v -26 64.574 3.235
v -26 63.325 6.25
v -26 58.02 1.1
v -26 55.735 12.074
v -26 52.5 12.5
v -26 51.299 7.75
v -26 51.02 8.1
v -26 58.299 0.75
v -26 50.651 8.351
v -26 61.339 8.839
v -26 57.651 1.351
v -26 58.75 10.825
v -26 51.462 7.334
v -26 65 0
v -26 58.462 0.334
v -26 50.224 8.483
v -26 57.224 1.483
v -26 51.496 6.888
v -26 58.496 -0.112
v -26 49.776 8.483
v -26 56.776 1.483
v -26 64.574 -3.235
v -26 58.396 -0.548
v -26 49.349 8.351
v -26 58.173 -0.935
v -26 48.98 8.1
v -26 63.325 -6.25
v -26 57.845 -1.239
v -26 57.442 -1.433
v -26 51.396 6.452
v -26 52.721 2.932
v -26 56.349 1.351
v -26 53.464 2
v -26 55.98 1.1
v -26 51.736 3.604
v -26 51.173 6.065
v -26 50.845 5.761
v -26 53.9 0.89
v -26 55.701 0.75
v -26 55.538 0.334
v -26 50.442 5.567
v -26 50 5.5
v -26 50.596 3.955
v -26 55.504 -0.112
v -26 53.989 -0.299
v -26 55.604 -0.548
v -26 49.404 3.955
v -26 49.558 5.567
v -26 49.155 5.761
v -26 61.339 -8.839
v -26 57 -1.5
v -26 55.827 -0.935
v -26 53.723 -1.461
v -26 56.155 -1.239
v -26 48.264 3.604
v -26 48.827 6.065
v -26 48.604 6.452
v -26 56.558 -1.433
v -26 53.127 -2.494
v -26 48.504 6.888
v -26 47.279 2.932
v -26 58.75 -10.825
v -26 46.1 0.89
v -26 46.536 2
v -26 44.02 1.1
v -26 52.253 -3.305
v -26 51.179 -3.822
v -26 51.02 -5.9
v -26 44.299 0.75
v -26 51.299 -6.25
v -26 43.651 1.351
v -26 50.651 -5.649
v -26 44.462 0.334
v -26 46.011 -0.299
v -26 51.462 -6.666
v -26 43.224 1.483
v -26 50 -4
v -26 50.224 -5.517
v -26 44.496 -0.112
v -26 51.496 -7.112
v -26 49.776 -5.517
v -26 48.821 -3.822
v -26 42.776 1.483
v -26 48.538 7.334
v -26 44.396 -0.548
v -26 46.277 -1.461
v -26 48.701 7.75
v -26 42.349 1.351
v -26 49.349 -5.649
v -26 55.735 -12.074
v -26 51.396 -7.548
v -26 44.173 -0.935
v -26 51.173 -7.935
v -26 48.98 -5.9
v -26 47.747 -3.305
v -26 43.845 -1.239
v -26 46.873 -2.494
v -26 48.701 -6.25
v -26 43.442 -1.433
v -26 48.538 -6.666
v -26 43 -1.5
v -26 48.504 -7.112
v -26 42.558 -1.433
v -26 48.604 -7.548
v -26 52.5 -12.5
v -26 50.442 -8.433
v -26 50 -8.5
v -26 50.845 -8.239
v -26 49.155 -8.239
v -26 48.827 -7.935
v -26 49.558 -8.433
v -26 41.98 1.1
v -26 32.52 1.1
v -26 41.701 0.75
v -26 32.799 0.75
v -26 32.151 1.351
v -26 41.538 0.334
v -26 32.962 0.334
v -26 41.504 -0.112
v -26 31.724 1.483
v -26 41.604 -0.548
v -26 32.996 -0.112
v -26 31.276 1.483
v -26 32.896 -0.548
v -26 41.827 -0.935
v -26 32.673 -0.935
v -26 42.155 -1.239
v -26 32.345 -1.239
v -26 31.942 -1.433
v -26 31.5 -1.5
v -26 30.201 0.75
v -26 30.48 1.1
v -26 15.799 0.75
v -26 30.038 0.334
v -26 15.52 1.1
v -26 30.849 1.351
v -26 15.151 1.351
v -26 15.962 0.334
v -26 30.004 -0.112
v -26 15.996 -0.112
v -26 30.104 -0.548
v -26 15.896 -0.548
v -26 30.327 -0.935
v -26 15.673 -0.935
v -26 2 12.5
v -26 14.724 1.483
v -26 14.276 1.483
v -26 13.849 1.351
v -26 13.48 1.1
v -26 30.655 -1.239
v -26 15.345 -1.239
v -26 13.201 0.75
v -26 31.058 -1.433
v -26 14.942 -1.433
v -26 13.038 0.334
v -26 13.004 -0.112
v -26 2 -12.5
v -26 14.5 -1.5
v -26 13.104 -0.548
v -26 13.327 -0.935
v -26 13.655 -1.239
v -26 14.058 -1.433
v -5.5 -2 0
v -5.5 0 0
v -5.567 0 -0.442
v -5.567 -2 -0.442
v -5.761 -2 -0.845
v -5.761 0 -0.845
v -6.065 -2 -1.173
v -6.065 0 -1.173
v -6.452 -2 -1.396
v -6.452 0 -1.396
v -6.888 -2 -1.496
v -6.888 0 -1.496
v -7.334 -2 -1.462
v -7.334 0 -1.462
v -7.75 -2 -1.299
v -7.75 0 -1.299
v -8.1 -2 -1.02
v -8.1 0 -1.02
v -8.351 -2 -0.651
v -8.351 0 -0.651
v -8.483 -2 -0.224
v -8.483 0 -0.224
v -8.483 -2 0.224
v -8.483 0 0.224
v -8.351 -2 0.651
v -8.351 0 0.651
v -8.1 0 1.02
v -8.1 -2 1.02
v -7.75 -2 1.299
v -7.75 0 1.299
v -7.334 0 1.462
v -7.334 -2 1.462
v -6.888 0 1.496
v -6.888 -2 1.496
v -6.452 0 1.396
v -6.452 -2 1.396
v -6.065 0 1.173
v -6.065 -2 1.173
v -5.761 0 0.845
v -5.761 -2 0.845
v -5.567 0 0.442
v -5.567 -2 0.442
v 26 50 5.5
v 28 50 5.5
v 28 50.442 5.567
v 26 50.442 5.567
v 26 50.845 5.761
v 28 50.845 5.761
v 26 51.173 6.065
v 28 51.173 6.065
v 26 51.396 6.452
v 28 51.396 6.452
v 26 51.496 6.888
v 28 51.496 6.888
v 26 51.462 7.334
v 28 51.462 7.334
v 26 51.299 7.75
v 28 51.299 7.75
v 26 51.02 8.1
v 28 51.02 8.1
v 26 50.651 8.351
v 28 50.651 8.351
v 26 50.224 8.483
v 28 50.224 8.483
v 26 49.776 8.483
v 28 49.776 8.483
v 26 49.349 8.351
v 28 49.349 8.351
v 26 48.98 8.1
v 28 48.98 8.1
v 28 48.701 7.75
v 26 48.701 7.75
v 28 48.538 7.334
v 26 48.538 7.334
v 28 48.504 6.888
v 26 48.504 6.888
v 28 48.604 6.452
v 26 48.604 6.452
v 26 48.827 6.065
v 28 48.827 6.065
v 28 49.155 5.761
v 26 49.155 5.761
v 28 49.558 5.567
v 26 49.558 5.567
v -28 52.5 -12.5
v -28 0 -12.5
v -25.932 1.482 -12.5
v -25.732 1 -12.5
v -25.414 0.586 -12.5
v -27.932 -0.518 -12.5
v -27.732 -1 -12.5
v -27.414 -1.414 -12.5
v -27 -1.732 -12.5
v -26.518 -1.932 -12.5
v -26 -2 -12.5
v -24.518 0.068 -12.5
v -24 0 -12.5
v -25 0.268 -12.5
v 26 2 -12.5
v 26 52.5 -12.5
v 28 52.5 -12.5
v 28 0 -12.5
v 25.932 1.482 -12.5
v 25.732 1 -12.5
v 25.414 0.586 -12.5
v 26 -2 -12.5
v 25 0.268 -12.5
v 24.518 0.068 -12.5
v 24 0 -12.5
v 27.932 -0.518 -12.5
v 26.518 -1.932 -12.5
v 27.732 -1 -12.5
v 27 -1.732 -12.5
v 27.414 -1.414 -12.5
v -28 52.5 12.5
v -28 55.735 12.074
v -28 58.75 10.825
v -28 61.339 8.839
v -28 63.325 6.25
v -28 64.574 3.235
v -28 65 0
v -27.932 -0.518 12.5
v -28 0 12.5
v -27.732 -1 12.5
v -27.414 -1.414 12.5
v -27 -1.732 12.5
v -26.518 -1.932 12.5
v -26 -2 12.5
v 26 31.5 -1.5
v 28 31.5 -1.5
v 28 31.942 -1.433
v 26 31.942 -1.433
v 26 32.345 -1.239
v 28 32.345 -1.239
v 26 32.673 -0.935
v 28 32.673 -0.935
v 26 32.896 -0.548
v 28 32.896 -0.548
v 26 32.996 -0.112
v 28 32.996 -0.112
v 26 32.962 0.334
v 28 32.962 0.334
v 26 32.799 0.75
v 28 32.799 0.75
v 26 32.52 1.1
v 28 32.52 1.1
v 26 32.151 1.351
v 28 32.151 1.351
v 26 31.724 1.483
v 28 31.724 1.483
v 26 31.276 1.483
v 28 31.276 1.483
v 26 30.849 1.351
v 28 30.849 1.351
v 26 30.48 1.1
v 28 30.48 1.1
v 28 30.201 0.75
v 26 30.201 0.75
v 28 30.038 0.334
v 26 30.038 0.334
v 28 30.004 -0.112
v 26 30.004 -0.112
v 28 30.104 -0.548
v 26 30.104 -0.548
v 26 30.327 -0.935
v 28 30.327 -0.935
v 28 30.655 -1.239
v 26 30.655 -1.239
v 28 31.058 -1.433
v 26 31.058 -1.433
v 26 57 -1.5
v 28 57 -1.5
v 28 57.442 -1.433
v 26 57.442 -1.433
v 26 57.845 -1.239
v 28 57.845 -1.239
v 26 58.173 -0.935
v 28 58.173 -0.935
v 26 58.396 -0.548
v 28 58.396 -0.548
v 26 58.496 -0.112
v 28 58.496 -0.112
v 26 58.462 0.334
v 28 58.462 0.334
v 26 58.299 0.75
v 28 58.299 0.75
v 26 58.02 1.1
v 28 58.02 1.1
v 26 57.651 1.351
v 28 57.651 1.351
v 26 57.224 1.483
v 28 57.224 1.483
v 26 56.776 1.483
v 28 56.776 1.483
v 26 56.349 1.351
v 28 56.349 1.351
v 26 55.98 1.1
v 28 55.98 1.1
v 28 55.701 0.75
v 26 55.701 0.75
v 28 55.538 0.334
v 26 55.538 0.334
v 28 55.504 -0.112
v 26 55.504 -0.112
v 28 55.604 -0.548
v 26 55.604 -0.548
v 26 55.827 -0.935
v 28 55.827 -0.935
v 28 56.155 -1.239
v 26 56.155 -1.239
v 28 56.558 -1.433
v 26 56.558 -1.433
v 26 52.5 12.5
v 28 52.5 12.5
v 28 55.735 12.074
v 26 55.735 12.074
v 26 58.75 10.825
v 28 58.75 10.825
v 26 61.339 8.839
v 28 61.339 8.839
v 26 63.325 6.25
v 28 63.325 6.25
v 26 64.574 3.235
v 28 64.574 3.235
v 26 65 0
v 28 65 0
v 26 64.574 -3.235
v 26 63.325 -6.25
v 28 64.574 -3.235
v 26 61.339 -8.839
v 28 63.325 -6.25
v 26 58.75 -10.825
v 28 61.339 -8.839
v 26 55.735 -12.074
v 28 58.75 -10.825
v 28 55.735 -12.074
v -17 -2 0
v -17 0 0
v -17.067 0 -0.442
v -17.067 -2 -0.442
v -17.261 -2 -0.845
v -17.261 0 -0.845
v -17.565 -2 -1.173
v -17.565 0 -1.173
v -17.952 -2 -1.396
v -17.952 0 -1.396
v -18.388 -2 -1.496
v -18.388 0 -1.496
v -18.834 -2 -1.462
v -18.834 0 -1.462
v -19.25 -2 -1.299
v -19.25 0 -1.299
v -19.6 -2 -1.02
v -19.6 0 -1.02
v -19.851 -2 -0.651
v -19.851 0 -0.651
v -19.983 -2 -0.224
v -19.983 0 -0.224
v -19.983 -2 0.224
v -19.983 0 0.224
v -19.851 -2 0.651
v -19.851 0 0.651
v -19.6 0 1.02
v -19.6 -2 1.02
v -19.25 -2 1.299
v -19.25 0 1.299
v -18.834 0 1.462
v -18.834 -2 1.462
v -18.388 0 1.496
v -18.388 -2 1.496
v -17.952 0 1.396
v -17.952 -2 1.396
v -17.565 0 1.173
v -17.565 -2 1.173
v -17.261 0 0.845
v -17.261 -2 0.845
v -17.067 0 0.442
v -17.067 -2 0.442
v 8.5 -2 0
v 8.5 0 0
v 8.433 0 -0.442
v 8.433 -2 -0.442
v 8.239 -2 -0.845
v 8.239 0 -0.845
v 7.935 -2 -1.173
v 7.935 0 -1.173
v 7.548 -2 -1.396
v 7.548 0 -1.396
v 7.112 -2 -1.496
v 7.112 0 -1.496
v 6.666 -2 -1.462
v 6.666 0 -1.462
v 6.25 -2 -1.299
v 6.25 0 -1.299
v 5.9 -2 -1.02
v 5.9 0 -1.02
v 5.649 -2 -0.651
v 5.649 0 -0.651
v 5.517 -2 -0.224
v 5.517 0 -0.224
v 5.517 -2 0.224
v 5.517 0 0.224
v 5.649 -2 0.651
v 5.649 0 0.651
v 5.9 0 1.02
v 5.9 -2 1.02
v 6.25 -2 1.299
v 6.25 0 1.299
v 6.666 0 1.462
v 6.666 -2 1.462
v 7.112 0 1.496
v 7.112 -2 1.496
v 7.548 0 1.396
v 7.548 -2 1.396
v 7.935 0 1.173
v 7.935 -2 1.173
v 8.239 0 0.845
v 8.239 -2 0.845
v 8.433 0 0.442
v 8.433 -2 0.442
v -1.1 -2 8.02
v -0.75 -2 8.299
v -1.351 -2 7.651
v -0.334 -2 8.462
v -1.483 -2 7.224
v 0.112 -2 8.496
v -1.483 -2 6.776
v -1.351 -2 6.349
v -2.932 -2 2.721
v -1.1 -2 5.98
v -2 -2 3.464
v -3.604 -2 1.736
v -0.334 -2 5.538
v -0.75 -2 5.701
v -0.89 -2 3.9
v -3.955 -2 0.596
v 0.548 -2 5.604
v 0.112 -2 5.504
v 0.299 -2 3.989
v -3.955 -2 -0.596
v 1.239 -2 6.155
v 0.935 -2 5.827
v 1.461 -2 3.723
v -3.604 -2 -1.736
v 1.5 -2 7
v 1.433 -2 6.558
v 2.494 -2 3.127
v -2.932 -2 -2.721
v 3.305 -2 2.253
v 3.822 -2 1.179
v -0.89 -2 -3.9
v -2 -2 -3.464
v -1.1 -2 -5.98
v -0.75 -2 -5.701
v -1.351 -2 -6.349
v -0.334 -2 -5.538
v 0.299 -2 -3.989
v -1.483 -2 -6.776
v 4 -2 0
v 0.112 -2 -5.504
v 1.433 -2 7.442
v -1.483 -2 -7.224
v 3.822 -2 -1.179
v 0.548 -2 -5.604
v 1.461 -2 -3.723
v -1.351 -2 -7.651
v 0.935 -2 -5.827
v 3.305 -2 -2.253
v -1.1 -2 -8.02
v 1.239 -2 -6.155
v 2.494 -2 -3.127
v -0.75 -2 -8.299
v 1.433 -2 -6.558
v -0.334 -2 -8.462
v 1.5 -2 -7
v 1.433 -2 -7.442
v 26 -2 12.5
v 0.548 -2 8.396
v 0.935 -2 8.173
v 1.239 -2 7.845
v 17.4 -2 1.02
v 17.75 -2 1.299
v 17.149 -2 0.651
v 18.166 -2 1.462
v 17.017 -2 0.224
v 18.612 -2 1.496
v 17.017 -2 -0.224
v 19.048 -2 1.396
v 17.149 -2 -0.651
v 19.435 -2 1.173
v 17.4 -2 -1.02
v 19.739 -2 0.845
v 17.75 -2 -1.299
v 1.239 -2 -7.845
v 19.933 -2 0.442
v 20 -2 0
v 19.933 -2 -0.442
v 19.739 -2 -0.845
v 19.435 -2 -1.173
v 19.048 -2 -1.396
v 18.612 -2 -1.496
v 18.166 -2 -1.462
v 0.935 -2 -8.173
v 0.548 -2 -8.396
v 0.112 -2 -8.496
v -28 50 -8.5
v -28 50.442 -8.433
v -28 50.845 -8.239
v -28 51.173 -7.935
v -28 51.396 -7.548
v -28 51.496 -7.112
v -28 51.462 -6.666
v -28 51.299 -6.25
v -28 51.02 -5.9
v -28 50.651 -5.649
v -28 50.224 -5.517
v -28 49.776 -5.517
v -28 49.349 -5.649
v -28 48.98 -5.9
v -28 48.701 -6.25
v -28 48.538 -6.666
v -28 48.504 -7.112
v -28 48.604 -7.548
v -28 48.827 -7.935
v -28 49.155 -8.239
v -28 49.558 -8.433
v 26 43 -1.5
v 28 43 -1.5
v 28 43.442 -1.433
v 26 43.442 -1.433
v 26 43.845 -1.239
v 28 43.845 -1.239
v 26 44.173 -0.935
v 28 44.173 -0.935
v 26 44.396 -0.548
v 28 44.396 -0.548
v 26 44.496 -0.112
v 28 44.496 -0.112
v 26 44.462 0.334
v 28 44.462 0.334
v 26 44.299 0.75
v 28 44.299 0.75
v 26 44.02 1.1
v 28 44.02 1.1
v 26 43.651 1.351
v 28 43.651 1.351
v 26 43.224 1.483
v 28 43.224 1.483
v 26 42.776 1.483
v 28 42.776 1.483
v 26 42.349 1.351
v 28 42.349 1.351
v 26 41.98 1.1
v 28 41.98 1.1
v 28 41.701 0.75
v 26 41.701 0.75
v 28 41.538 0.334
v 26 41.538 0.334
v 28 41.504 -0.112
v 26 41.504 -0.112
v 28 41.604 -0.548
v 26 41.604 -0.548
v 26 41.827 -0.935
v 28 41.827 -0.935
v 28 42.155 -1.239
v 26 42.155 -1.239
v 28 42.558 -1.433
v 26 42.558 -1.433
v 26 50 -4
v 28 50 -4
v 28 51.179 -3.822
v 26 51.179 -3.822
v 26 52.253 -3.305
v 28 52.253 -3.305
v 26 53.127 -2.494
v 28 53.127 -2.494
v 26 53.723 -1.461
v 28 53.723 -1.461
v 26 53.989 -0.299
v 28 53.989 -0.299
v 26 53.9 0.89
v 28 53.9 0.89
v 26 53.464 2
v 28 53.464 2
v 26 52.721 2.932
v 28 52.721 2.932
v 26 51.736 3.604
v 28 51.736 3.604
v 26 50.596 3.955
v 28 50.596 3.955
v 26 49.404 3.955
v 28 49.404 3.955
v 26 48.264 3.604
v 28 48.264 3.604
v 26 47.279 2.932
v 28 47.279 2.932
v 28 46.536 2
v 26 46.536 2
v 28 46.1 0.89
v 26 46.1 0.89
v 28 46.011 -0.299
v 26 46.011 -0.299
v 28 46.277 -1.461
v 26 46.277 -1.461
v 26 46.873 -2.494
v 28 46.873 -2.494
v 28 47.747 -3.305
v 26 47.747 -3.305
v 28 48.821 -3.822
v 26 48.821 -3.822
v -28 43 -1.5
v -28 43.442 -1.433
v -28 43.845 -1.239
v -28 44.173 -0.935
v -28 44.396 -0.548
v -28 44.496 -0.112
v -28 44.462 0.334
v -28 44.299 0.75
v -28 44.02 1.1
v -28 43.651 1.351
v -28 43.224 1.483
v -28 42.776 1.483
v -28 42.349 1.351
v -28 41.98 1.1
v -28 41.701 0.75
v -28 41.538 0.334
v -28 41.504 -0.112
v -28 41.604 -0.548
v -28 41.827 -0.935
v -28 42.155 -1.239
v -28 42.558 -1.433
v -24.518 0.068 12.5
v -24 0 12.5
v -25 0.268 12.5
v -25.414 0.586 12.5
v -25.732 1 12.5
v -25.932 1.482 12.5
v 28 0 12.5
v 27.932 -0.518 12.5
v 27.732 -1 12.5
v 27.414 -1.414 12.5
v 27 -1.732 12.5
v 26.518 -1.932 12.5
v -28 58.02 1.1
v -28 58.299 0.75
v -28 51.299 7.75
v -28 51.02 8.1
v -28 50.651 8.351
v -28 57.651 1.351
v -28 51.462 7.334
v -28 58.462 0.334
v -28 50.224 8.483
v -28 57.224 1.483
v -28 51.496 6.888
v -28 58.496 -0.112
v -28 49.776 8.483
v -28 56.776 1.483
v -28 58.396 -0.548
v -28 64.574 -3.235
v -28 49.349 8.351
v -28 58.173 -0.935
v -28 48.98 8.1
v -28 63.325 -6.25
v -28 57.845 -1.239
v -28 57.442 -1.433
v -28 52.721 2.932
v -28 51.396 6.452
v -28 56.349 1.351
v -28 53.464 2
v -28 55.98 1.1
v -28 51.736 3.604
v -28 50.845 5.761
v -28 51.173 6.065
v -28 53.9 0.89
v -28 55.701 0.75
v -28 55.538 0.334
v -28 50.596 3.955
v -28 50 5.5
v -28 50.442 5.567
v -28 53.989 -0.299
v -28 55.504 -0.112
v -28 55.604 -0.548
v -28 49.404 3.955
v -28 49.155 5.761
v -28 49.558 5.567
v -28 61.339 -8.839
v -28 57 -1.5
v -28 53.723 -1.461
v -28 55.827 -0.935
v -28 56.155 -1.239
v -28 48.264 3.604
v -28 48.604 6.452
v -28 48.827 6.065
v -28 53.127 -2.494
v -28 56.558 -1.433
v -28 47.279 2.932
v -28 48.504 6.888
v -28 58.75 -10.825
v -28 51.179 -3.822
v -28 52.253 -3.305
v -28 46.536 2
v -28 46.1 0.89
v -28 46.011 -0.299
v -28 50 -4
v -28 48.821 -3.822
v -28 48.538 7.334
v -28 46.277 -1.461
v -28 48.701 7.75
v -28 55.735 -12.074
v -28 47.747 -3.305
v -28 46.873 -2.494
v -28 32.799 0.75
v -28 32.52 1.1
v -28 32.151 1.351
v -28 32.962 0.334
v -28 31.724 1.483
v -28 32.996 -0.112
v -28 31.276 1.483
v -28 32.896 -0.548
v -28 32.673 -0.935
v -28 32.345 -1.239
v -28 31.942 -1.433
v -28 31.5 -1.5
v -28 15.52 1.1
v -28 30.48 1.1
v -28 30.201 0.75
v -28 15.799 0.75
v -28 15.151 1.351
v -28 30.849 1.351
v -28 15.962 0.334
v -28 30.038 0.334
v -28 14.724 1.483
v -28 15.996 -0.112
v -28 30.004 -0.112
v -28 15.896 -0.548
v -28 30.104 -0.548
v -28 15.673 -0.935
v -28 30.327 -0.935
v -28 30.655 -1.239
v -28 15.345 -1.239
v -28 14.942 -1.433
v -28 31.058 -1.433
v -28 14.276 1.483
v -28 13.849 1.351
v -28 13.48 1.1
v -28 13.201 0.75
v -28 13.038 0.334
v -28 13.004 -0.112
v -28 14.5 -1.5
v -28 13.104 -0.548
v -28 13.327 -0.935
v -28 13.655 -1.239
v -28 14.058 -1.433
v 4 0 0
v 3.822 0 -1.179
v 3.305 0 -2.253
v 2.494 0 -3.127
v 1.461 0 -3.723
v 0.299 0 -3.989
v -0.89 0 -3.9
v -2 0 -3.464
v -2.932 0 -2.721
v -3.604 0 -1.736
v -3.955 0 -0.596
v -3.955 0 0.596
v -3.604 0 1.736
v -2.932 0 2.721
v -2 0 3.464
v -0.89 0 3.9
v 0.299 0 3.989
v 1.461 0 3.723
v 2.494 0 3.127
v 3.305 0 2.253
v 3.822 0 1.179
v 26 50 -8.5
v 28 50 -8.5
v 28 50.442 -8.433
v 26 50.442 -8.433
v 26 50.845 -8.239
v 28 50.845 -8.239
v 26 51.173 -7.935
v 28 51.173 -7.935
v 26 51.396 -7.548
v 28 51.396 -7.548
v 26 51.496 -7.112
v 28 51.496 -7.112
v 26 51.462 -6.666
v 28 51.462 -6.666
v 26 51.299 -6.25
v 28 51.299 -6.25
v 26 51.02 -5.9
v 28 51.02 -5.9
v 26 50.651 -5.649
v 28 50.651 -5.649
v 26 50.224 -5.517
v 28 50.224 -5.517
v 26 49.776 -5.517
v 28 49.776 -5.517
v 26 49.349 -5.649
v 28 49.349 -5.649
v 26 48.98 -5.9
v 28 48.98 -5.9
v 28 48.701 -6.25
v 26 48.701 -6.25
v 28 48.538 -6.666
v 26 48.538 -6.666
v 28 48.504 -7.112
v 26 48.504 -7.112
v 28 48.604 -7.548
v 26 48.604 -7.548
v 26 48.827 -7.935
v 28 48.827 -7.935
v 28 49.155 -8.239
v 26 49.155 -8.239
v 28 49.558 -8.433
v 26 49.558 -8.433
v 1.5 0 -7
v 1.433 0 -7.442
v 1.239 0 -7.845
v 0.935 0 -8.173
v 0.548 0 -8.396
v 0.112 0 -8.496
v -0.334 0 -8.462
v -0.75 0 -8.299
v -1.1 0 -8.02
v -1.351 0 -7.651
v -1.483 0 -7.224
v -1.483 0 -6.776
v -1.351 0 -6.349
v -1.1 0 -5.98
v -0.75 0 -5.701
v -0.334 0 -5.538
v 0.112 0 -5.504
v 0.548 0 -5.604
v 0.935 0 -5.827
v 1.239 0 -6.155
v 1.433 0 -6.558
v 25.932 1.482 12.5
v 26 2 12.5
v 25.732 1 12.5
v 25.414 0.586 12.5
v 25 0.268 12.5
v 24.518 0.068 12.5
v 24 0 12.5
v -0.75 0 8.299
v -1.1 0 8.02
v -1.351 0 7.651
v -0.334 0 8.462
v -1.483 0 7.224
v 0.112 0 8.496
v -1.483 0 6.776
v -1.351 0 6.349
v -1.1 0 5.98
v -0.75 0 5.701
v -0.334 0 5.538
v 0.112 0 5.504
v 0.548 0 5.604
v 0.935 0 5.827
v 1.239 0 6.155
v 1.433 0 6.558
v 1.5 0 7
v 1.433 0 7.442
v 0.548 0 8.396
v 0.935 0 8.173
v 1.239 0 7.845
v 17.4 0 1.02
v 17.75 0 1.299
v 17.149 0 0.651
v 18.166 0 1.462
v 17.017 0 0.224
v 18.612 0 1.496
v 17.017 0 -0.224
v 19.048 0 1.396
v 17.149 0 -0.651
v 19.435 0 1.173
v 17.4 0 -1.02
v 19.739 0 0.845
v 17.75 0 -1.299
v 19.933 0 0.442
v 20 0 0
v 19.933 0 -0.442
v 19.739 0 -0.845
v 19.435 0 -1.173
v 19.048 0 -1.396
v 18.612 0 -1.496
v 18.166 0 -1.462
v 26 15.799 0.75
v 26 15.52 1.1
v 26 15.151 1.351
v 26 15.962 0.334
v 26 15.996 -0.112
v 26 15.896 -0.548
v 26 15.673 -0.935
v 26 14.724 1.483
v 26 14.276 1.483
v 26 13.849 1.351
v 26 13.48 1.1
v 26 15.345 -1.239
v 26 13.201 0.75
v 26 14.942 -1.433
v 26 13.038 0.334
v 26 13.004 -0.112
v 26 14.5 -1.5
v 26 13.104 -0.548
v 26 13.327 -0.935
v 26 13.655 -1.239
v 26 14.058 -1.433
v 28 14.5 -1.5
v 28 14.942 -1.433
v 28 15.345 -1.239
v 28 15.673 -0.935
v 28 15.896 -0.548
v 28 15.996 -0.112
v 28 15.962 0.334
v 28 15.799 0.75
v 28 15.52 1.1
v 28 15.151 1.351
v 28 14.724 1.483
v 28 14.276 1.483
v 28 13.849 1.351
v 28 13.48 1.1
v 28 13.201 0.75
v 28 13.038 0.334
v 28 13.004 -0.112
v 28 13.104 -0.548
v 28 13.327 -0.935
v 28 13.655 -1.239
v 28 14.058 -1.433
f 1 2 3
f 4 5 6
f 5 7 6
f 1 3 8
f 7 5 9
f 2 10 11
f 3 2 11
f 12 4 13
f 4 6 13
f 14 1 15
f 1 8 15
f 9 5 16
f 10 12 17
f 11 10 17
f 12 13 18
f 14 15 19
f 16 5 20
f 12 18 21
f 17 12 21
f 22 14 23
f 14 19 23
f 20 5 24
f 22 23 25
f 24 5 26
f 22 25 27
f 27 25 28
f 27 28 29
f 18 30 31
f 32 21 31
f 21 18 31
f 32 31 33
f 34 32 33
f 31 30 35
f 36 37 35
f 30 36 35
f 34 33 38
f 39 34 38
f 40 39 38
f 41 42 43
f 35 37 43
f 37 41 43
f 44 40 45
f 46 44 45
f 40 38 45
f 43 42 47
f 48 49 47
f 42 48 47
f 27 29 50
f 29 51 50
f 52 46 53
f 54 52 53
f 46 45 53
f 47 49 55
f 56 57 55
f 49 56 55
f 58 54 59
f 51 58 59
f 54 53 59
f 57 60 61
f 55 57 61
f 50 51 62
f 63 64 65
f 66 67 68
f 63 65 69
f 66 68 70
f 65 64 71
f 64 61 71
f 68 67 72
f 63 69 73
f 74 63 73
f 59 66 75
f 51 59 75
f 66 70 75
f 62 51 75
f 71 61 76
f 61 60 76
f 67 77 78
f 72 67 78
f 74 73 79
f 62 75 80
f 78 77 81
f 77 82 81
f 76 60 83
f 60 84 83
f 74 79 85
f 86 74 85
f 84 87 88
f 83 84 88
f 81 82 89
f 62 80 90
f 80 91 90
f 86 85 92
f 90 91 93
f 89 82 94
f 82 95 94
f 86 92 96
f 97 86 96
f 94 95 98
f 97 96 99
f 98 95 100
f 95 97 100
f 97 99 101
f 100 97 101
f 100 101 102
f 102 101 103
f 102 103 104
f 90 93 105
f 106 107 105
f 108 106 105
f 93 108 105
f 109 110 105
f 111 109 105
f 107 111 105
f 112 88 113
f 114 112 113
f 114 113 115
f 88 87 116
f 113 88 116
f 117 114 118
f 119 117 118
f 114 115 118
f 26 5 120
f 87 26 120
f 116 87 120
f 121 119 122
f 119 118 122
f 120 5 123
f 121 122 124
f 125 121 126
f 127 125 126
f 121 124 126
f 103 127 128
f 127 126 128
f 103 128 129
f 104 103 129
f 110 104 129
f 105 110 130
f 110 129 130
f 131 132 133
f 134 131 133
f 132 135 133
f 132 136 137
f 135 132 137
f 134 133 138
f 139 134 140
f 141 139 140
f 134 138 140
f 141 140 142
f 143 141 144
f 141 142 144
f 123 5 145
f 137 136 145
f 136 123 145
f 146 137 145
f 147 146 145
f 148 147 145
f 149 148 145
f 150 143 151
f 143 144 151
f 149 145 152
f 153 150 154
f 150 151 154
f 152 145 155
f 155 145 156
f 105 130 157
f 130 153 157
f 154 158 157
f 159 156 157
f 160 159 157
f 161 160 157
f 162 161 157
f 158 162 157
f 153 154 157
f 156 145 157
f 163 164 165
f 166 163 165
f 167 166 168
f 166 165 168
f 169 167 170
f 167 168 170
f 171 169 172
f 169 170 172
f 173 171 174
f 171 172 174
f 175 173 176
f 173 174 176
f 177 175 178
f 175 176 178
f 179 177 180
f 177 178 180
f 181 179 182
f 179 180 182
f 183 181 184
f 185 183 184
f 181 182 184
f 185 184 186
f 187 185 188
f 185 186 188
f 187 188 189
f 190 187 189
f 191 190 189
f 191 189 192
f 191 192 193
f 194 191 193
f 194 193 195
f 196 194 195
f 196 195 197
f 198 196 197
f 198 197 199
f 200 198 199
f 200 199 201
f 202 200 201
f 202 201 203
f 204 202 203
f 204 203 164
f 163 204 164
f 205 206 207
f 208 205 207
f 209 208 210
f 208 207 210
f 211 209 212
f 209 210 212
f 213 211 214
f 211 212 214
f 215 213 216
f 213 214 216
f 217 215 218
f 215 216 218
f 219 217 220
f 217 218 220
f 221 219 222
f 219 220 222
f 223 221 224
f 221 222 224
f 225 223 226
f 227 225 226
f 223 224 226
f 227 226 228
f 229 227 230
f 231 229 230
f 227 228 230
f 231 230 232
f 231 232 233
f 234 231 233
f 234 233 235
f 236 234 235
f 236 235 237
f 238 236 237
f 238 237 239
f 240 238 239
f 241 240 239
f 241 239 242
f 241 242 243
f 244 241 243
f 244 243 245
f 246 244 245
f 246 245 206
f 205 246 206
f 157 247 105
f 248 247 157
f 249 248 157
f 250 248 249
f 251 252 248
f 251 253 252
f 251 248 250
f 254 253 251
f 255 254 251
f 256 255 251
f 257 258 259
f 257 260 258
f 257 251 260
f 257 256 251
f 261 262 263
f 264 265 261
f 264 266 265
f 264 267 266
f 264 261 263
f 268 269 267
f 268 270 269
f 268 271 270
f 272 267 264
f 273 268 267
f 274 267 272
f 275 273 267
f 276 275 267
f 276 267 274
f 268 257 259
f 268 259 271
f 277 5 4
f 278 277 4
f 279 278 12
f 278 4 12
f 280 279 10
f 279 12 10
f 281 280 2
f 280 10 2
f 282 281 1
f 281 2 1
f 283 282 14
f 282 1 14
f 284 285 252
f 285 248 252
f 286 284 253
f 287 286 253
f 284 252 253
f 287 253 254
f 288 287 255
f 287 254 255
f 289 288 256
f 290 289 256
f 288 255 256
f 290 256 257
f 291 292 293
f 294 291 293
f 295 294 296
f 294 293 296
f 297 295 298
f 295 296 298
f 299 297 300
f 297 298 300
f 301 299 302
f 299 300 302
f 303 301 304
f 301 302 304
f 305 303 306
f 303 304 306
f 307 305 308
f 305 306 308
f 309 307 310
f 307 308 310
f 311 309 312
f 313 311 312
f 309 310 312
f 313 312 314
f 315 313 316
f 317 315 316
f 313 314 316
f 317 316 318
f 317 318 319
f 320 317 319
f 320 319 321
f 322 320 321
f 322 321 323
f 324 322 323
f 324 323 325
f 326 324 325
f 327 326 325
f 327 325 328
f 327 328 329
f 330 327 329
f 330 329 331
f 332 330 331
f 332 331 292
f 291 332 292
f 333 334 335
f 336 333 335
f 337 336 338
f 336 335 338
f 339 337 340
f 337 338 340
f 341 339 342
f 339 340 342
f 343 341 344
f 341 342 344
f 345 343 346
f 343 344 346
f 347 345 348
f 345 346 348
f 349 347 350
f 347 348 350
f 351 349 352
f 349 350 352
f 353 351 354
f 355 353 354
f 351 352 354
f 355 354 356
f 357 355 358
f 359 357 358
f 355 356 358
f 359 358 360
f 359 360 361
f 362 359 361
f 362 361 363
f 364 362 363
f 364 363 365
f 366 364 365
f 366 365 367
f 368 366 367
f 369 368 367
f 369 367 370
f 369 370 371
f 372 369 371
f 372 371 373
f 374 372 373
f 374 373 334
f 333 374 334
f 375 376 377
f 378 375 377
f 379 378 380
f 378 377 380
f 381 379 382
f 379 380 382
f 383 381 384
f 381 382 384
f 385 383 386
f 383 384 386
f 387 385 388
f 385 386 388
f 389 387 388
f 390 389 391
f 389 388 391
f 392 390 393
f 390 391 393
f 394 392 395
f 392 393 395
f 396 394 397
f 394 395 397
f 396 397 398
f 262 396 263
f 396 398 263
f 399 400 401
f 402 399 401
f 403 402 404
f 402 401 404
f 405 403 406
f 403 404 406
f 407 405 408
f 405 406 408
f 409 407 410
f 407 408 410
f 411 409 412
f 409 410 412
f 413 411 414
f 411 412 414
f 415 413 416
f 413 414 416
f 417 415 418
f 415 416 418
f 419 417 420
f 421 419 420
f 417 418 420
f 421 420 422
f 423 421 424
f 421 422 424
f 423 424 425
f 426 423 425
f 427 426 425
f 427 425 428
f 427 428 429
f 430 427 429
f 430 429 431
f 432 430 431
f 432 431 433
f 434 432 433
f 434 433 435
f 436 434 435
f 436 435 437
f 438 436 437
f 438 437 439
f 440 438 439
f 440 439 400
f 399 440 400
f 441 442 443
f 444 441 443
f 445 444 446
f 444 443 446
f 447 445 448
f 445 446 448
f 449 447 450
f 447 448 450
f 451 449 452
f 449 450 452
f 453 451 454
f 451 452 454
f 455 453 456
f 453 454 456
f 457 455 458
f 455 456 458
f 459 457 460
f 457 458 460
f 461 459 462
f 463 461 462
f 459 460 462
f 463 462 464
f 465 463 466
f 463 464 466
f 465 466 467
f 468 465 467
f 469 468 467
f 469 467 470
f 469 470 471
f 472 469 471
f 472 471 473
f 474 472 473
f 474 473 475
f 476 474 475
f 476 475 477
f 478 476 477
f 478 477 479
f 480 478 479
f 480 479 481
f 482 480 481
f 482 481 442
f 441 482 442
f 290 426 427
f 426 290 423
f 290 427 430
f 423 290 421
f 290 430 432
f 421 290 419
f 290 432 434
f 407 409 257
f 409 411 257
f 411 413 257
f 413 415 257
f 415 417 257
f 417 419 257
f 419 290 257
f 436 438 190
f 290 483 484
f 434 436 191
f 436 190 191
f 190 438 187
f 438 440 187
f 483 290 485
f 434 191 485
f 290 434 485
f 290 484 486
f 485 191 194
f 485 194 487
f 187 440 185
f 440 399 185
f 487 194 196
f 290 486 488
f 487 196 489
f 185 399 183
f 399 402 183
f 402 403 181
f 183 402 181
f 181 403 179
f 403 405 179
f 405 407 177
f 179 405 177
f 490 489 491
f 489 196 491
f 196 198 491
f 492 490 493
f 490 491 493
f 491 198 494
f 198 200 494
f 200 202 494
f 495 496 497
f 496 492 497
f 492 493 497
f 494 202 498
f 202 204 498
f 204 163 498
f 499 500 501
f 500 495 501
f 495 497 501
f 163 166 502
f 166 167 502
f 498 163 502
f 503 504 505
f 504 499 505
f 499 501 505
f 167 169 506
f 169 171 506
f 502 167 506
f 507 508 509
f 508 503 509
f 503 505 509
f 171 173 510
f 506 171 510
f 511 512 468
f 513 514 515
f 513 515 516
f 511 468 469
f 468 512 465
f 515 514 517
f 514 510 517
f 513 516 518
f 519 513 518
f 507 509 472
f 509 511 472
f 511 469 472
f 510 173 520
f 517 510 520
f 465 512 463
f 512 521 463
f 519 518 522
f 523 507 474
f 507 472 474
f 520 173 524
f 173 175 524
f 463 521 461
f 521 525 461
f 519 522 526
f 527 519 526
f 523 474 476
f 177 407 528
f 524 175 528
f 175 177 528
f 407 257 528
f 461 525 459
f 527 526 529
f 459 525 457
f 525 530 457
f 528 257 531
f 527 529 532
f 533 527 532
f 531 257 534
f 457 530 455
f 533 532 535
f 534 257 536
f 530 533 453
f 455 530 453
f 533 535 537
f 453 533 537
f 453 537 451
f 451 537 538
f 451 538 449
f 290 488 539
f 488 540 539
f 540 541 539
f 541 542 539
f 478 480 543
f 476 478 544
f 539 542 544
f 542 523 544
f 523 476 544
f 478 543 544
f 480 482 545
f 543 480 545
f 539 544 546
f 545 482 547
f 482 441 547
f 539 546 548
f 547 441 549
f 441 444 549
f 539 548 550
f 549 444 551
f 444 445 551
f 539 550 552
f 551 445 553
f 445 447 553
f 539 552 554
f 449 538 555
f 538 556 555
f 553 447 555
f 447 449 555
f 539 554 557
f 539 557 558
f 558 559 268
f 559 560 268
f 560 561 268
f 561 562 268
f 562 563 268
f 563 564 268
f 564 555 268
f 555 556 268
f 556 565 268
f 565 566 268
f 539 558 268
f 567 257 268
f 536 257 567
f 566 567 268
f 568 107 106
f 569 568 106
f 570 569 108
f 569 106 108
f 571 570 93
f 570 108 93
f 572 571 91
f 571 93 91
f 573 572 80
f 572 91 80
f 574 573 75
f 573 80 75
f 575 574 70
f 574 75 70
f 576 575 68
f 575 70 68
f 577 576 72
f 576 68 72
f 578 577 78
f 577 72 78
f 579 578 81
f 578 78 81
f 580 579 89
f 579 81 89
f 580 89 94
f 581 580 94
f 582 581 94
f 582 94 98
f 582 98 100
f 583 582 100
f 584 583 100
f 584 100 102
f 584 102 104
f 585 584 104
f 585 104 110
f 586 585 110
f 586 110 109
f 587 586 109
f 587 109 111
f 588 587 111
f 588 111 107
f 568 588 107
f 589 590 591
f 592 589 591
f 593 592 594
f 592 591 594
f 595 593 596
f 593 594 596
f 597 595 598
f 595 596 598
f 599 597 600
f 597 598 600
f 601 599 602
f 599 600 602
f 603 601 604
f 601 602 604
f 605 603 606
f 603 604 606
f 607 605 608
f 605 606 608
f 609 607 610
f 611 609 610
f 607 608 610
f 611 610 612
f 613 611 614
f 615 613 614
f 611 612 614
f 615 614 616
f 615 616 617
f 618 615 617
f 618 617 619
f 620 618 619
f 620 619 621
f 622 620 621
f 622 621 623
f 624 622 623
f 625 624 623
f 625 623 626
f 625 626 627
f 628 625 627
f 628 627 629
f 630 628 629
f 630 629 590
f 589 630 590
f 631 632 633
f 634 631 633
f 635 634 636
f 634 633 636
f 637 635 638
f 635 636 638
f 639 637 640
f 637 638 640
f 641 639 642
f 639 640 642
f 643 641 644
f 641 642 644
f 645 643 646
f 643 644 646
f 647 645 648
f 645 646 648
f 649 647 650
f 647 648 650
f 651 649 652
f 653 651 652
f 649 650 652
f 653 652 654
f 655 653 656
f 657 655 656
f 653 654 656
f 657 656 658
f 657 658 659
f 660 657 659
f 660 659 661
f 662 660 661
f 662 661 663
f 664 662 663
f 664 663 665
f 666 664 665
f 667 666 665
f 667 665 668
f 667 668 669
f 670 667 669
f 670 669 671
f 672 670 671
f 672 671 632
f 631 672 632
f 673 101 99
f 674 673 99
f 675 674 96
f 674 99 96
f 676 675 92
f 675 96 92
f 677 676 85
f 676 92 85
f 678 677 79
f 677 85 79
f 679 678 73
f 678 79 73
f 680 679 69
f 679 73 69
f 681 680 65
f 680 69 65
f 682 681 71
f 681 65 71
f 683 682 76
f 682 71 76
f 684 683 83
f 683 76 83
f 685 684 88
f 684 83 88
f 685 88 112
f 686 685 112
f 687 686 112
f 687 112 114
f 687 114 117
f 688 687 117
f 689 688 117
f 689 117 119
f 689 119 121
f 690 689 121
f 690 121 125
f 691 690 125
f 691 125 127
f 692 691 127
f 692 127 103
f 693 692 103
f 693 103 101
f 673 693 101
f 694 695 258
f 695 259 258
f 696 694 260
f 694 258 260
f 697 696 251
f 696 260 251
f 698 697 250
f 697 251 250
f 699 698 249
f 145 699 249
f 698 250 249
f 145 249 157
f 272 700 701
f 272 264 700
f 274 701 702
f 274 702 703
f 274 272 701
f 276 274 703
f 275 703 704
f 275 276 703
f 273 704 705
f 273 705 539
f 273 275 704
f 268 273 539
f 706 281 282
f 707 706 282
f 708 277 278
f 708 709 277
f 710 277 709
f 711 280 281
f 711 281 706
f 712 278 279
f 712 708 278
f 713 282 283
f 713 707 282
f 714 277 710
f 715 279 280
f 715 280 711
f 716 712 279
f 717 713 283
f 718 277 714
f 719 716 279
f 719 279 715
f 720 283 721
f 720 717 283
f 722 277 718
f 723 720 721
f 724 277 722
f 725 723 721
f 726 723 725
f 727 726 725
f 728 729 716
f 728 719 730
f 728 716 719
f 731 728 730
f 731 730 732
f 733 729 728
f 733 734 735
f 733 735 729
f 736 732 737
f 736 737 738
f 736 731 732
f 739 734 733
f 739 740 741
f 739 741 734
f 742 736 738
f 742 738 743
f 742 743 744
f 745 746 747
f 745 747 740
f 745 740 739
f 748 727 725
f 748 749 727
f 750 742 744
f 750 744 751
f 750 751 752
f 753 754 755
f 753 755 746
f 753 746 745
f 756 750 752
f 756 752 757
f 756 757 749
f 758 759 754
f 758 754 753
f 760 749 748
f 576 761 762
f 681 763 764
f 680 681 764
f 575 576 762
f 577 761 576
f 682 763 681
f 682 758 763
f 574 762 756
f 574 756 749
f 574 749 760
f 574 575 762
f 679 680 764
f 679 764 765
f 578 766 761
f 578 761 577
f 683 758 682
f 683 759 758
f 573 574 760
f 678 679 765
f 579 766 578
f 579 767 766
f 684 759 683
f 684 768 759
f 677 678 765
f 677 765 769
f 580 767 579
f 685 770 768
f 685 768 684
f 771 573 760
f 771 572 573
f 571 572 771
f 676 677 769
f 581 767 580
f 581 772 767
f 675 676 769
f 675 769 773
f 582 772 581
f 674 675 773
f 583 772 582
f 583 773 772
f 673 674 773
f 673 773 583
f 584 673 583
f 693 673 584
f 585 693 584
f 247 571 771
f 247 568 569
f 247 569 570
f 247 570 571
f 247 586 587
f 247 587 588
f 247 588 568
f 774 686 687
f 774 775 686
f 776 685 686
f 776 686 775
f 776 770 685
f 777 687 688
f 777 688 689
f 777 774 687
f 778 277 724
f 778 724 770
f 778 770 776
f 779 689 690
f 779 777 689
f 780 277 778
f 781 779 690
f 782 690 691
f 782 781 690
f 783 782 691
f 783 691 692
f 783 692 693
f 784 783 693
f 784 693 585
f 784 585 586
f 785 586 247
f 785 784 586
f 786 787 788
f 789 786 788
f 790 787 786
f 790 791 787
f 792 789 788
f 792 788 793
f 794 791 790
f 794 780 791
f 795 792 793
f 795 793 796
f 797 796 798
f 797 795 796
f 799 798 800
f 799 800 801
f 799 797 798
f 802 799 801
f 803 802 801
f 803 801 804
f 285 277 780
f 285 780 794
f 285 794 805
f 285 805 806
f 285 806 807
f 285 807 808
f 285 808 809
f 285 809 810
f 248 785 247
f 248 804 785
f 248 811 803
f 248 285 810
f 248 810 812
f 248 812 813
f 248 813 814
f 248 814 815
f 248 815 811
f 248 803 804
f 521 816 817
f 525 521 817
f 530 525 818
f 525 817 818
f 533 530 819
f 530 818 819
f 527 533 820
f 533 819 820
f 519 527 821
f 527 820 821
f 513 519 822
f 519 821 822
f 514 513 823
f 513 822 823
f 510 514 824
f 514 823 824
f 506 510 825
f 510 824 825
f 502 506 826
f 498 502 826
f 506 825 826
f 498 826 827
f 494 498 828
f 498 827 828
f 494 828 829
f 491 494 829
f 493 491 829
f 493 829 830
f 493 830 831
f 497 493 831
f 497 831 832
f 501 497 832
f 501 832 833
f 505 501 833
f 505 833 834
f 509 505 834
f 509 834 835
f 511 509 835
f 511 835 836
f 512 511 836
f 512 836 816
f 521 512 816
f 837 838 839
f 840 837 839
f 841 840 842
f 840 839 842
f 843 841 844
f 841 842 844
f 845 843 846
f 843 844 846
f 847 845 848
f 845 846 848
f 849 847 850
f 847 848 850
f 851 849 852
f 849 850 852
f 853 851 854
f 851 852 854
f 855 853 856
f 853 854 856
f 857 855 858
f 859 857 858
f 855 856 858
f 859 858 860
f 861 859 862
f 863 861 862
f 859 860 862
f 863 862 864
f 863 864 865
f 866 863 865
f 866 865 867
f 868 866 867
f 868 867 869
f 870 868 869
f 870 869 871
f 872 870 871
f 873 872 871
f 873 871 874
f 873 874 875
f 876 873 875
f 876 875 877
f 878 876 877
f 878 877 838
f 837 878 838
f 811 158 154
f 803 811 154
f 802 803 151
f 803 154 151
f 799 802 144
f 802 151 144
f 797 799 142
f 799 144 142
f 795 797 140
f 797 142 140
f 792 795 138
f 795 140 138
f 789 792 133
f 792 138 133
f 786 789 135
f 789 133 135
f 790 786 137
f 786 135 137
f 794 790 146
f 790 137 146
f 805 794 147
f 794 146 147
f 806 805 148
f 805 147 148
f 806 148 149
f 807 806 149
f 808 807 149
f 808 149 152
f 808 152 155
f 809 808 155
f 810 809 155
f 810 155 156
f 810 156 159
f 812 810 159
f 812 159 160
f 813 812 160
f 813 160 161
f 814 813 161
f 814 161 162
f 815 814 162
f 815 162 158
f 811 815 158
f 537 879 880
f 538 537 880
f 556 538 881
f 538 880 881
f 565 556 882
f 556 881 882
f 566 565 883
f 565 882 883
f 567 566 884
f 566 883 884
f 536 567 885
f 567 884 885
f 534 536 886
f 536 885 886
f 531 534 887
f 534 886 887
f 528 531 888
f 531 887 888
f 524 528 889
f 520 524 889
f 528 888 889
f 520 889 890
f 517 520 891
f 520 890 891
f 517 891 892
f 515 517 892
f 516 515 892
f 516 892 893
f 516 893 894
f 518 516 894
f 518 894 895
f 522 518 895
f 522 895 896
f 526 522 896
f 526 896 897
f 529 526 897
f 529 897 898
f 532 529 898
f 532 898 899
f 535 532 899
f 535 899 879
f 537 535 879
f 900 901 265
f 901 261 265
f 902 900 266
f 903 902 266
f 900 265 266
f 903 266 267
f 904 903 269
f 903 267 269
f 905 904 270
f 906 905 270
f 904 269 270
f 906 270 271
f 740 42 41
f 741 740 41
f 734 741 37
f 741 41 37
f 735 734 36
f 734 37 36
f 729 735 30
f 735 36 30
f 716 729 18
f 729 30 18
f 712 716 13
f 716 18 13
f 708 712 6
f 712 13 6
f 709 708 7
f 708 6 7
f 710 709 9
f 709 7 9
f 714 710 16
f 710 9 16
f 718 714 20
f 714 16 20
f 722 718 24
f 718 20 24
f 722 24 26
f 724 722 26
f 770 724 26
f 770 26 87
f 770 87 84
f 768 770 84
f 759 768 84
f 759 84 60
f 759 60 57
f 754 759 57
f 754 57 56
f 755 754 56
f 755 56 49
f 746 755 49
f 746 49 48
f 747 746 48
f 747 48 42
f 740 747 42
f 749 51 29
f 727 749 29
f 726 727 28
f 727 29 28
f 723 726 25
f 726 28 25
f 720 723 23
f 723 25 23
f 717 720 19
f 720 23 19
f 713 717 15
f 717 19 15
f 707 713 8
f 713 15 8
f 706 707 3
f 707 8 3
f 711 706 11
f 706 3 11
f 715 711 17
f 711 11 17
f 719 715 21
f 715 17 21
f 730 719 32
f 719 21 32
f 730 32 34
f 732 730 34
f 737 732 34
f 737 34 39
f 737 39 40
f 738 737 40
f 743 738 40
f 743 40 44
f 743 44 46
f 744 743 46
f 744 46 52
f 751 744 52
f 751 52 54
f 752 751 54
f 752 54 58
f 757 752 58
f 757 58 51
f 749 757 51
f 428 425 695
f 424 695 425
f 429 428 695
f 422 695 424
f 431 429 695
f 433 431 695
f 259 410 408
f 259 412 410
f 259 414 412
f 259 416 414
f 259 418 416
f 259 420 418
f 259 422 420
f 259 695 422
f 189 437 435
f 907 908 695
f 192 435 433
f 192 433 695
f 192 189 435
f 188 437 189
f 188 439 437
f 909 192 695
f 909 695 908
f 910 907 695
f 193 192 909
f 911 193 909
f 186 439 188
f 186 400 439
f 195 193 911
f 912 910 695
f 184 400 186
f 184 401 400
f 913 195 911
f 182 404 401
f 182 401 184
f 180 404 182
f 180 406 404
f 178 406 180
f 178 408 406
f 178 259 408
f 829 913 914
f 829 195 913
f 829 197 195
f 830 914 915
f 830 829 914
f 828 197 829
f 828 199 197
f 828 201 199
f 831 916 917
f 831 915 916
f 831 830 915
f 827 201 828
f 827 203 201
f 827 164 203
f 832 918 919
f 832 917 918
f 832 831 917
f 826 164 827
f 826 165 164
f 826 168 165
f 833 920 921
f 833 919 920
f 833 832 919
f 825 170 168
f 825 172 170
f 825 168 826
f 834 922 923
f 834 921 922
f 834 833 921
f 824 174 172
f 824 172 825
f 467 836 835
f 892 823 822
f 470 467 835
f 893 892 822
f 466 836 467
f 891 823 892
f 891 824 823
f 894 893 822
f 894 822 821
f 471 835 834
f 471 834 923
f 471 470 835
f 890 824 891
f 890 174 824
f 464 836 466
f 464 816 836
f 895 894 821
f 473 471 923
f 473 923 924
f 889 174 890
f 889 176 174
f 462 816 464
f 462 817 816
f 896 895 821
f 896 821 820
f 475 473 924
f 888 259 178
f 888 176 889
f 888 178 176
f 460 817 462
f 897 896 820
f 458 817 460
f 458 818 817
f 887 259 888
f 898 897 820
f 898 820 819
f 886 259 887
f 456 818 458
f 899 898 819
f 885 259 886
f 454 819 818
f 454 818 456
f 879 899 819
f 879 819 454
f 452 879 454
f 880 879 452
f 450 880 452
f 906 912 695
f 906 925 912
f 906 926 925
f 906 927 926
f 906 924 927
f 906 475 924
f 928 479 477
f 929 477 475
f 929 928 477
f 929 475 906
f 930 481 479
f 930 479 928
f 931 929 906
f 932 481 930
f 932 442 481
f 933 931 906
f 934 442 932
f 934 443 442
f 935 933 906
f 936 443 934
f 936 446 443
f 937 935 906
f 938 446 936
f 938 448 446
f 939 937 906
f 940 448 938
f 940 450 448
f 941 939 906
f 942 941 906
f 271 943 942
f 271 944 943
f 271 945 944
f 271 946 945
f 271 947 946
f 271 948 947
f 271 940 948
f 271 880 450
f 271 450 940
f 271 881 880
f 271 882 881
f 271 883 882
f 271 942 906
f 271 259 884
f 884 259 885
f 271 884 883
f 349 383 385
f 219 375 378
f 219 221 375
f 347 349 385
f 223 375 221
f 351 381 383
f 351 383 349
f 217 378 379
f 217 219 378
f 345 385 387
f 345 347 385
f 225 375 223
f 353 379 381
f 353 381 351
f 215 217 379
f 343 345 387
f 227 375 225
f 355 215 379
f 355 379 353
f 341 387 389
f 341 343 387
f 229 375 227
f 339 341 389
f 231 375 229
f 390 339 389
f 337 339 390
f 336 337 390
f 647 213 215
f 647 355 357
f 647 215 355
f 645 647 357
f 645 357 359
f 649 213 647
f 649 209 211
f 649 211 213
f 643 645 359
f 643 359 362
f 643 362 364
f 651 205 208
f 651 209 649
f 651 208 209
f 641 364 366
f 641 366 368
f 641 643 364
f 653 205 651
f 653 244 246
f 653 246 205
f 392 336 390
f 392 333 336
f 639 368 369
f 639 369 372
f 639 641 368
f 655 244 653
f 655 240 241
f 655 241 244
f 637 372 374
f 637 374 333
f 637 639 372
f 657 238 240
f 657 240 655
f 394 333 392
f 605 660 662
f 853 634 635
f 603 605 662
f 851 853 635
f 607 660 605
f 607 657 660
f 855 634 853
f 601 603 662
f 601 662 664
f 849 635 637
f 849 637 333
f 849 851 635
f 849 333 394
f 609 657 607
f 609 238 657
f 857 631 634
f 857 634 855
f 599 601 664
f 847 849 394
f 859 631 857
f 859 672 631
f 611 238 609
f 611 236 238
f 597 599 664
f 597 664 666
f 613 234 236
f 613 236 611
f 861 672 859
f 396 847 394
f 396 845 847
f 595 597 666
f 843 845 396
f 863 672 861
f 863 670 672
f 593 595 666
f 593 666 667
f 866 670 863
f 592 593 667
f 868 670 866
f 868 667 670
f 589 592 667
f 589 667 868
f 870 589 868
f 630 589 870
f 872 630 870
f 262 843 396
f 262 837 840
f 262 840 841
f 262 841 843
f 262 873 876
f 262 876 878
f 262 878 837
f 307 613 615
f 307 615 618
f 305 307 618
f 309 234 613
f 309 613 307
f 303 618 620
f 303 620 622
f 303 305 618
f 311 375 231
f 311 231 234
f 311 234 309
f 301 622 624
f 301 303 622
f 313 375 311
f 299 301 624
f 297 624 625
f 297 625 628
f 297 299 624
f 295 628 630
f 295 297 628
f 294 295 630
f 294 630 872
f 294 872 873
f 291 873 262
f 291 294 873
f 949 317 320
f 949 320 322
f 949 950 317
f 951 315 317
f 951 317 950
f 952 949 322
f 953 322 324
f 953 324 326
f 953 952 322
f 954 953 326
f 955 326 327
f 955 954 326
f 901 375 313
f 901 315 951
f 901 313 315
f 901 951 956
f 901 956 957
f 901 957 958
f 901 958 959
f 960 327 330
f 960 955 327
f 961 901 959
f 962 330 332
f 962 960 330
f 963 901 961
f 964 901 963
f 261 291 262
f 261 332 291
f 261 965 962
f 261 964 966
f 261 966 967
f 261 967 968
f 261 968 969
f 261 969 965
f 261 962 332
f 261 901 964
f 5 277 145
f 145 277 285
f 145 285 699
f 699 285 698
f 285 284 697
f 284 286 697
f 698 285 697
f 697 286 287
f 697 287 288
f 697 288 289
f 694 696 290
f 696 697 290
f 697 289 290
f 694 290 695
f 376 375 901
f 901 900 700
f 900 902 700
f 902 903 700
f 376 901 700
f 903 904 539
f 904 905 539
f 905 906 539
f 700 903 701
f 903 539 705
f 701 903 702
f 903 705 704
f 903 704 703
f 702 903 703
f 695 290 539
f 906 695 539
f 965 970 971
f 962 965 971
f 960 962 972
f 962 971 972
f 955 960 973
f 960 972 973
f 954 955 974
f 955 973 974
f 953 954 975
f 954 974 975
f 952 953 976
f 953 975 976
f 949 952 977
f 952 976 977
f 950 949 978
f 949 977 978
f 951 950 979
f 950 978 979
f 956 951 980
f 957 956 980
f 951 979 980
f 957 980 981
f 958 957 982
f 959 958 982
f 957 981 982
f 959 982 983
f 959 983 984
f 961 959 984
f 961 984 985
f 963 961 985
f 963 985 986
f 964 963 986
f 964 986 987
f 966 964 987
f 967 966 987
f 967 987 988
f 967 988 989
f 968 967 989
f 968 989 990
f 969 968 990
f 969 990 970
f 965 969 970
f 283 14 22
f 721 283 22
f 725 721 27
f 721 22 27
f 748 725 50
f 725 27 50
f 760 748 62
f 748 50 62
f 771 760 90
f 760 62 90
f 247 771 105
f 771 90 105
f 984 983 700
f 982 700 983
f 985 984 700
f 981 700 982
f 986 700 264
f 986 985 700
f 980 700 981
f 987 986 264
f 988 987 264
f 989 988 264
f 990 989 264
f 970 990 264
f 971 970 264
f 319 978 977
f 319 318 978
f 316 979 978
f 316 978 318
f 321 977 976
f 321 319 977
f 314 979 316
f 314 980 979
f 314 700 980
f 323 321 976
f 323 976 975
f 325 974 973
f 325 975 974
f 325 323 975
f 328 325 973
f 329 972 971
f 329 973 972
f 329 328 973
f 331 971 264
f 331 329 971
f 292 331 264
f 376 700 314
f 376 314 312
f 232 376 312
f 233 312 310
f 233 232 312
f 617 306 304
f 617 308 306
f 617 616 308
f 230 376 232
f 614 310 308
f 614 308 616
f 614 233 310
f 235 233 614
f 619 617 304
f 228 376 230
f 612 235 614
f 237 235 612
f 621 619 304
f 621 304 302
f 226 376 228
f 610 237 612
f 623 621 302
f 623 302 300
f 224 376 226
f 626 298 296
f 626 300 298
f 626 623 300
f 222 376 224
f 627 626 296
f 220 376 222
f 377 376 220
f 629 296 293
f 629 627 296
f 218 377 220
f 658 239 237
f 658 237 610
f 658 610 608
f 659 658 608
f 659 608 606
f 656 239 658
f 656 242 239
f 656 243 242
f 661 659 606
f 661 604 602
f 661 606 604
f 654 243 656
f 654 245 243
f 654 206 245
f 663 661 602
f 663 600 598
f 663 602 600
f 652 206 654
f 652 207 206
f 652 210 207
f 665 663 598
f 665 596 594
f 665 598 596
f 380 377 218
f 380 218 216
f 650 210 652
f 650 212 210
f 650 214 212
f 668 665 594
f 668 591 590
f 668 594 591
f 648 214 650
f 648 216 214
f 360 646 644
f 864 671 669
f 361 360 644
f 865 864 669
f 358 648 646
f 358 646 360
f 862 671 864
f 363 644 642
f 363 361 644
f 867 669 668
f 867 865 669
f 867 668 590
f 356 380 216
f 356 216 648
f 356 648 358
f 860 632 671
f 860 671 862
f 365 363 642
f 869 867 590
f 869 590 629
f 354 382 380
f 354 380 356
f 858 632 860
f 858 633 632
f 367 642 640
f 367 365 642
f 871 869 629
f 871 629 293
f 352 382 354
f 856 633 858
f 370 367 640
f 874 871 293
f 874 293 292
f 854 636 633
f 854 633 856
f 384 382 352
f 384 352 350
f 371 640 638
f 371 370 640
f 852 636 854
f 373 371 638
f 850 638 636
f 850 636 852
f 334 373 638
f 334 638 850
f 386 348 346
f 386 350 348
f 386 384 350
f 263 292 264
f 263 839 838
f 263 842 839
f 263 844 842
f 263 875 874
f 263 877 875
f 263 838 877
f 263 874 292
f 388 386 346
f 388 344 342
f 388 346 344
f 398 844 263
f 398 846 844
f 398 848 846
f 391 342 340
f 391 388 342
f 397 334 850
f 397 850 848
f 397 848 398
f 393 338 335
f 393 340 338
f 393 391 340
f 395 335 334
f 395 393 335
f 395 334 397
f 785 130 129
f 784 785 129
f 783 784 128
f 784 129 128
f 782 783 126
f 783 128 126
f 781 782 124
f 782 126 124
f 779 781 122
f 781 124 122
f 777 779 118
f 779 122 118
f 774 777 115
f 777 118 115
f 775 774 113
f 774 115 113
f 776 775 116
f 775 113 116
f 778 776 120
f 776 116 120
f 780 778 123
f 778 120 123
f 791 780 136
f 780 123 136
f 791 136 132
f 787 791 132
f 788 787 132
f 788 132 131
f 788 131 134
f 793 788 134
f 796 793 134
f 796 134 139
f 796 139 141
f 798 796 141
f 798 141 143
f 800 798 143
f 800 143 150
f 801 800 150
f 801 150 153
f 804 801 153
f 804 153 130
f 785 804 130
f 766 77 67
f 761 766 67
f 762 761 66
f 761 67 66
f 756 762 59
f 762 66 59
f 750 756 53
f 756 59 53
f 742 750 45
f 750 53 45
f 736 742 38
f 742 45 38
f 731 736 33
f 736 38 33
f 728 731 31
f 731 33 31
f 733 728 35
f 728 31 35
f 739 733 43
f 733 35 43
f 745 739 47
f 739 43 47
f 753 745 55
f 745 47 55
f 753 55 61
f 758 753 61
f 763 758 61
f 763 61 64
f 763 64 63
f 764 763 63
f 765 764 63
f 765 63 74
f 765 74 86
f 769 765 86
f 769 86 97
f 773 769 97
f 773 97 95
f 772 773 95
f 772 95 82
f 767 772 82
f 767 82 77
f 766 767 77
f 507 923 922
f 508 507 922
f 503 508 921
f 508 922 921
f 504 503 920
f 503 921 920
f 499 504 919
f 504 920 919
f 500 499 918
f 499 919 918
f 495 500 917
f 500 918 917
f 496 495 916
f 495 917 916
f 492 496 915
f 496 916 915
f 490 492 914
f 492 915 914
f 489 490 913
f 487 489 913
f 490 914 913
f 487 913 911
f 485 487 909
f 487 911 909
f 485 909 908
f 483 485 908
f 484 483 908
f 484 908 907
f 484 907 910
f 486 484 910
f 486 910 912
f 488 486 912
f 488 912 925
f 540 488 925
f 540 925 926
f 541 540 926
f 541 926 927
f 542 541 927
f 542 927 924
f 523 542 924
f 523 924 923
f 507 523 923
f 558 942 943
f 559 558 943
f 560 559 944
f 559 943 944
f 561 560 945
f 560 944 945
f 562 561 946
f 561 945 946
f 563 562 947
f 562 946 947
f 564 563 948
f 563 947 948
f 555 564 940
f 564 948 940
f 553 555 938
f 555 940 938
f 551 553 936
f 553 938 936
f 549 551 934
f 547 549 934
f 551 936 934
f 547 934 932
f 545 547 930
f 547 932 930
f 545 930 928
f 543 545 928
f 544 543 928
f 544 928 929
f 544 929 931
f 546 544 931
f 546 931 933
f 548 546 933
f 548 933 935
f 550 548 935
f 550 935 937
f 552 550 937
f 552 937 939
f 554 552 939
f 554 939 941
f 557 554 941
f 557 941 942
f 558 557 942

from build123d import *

# Parameters (mm, degrees)
SKETCH1_W           = 56
SKETCH1_H           = 25
BOSS_EXTRUDE1_DEPTH = 2
SKETCH1_3_W         = 2
SKETCH1_3_H         = 25
BOSS_EXTRUDE2_DEPTH = 65
FILLET4_R           = 2
SKETCH2_R           = 1.5
SKETCH2_R_2         = 4
CUT_EXTRUDE1_DEPTH  = 65
SKETCH3_R           = 4
SKETCH3_R_2         = 1.5
CUT_EXTRUDE2_DEPTH  = 65


with BuildPart() as part:
    # Sketch1 → Boss-Extrude1 (new body)
    with BuildSketch(Plane(origin=(0, 0, 0), x_dir=(1, 0, 0), z_dir=(0, 1, 0))):
        Rectangle(SKETCH1_W, SKETCH1_H)
    extrude(amount=-BOSS_EXTRUDE1_DEPTH)

    # Sketch1<3> → Boss-Extrude2 (add)
    with BuildSketch(Plane(origin=(0, 0, 0), x_dir=(1, 0, 0), z_dir=(0, 1, 0))):
        with Locations((-27, 0)):
            Rectangle(SKETCH1_3_W, SKETCH1_3_H)
        with Locations((27, 0)):
            Rectangle(SKETCH1_3_W, SKETCH1_3_H)
    extrude(amount=BOSS_EXTRUDE2_DEPTH)

    # Fillet4
    fillet4_edges = [part.edges().sort_by_distance(p)[0] for p in [
        (28, -2, 0),
        (26, 0, 0),
        (-28, -2, 0),
        (-26, 0, 0),
    ]]
    fillet(fillet4_edges, radius=FILLET4_R)

    # Sketch2 → Cut-Extrude1 (cut)
    with BuildSketch(Plane(origin=(28, 0, 0), x_dir=(0, 0, -1), z_dir=(1, 0, 0))):
        with BuildLine():
            Line((12.5, 65), (0, 65))
            ThreePointArc((0, 65), (8.838834765, 61.338834765), (12.5, 52.5))
            Line((12.5, 52.5), (12.5, 65))
        make_face()
        with BuildLine():
            Line((-12.5, 65), (-12.5, 52.5))
            ThreePointArc((-12.5, 52.5), (-8.838834765, 61.338834765), (0, 65))
            Line((0, 65), (-12.5, 65))
        make_face()
        with Locations((0, 14.5)):
            Circle(SKETCH2_R)
        with Locations((0, 31.5)):
            Circle(SKETCH2_R)
        with Locations((0, 50)):
            Circle(SKETCH2_R_2)
        with Locations((0, 57)):
            Circle(SKETCH2_R)
        with Locations((7, 50)):
            Circle(SKETCH2_R)
        with Locations((0, 43)):
            Circle(SKETCH2_R)
        with Locations((-7, 50)):
            Circle(SKETCH2_R)
    extrude(amount=-CUT_EXTRUDE1_DEPTH, mode=Mode.SUBTRACT)

    # Sketch3 → Cut-Extrude2 (cut)
    with BuildSketch(Plane(origin=(0, 0, 0), x_dir=(1, 0, 0), z_dir=(0, 1, 0))):
        Circle(SKETCH3_R)
        with Locations((0, 7)):
            Circle(SKETCH3_R_2)
        with Locations((7, 0)):
            Circle(SKETCH3_R_2)
        with Locations((0, -7)):
            Circle(SKETCH3_R_2)
        with Locations((-7, 0)):
            Circle(SKETCH3_R_2)
        with Locations((-18.5, 0)):
            Circle(SKETCH3_R_2)
        with Locations((18.5, 0)):
            Circle(SKETCH3_R_2)
    extrude(amount=-CUT_EXTRUDE2_DEPTH, mode=Mode.SUBTRACT)


solid = part.part
